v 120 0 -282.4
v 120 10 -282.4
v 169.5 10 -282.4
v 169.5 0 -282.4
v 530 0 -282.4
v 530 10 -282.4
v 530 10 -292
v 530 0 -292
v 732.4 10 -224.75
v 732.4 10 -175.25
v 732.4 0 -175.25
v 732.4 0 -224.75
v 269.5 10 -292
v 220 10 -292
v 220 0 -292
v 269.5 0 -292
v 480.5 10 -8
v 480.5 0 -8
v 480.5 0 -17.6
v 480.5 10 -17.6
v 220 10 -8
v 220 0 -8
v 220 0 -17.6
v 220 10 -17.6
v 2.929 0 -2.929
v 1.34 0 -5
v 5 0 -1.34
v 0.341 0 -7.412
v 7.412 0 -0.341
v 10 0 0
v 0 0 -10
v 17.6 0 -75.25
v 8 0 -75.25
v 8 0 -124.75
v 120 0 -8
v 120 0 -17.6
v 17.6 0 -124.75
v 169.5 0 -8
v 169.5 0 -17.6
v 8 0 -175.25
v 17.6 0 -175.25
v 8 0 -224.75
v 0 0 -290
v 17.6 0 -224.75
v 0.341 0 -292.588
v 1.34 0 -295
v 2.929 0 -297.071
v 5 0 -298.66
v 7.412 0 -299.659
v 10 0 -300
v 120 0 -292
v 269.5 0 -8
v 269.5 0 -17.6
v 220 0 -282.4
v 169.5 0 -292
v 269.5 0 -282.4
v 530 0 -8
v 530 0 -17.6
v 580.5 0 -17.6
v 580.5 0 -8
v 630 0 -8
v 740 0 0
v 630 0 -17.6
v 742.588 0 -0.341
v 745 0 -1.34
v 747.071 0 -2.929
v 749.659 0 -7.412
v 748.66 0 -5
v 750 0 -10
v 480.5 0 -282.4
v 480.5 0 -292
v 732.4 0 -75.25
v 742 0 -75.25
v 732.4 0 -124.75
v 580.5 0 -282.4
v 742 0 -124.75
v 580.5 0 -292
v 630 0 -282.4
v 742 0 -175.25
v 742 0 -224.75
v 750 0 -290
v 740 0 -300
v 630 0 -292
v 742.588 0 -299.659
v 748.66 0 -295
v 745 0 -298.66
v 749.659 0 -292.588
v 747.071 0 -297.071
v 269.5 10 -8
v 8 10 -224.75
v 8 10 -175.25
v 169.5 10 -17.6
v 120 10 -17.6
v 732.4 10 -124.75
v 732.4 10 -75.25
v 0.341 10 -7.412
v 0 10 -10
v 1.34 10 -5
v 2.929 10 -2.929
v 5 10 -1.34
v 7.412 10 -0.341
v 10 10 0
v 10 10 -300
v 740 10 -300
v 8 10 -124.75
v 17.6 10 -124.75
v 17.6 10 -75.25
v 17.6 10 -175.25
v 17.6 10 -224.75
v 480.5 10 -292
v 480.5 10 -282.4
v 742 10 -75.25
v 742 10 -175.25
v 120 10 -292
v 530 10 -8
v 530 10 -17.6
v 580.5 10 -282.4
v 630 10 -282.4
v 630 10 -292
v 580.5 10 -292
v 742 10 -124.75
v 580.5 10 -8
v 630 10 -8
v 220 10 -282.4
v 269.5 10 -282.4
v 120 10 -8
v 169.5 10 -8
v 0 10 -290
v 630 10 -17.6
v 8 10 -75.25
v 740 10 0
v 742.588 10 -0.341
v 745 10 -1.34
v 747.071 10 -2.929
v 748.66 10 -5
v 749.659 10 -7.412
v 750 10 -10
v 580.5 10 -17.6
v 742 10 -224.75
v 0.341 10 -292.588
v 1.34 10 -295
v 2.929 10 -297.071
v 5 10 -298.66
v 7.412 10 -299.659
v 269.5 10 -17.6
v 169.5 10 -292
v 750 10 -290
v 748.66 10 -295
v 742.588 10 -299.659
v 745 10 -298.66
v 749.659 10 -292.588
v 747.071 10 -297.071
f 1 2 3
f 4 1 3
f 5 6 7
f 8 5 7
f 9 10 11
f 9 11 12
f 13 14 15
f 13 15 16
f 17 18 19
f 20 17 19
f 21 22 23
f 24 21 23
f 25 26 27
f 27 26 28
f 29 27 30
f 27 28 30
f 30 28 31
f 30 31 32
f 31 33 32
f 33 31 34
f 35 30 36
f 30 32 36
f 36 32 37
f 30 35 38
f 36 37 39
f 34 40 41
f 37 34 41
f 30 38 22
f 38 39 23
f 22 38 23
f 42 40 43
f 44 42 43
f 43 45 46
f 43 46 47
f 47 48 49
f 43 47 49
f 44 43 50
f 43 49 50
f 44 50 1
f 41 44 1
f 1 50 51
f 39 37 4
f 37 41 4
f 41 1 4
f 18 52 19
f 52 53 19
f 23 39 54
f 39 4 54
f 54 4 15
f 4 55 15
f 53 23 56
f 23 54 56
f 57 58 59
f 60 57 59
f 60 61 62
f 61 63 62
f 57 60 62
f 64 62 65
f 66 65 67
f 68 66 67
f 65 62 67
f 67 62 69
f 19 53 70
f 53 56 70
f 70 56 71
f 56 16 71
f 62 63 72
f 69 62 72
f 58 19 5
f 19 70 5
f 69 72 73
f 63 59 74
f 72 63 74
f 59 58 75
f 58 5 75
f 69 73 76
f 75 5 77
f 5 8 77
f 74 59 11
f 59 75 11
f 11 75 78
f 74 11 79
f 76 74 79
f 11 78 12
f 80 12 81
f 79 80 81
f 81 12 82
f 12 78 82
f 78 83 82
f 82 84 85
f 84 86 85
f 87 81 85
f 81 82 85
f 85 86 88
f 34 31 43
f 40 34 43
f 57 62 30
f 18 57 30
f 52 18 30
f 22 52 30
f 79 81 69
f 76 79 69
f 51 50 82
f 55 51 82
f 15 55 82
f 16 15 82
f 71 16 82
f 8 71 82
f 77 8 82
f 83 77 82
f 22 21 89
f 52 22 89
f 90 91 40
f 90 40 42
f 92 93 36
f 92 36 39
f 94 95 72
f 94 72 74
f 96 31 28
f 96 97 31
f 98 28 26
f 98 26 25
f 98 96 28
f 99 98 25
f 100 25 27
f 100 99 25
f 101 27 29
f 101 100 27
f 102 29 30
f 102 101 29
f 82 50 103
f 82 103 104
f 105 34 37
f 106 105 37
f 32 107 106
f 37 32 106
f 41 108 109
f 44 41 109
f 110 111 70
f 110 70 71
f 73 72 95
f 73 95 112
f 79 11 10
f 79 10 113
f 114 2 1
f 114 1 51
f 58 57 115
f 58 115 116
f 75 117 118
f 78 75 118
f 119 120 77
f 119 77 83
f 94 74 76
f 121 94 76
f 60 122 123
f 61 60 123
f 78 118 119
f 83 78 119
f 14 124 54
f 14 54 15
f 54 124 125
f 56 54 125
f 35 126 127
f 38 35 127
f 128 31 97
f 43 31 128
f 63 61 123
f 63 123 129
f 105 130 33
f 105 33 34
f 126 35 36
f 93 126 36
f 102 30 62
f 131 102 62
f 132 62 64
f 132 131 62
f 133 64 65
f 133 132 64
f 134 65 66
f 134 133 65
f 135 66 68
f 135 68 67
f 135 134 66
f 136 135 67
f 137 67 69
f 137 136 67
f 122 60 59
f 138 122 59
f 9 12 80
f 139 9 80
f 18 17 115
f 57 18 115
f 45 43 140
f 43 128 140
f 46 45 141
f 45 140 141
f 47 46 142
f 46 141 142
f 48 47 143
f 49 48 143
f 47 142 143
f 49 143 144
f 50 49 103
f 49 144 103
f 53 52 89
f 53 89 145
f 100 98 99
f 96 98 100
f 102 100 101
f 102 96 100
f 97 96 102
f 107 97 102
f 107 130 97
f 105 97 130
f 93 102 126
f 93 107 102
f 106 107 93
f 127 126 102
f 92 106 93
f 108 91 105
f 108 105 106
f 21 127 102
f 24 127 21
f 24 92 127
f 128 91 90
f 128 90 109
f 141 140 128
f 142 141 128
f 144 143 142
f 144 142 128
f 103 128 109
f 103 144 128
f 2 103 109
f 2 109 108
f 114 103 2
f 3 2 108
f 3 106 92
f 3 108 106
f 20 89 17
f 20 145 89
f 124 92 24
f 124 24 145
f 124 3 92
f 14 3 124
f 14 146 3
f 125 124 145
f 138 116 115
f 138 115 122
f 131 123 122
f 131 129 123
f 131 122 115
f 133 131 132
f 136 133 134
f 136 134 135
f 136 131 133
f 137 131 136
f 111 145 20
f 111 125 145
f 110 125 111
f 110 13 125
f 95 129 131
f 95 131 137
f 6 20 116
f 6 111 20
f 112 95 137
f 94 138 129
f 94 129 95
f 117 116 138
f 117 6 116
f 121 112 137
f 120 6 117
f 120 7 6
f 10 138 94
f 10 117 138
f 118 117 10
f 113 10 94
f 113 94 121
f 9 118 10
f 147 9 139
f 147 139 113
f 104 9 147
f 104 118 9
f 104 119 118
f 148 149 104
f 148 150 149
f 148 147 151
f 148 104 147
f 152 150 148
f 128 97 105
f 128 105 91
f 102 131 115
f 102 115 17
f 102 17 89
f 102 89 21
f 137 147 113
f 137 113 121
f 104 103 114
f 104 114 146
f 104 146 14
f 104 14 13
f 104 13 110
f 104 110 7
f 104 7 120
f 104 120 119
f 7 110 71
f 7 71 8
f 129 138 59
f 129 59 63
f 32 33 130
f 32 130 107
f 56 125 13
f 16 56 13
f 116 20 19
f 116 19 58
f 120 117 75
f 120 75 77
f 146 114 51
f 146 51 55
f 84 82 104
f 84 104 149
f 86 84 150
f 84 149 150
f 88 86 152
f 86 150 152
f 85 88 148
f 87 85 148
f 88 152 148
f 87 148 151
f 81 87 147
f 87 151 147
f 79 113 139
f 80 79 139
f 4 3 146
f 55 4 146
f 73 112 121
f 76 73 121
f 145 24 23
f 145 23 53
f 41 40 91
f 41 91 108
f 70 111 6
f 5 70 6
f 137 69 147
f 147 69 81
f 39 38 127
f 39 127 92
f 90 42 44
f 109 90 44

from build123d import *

# Parameters (mm, degrees)
SKETCH1_W           = 750
SKETCH1_H           = 300
BOSS_EXTRUDE1_DEPTH = 10
SKETCH4_W           = 9.6
SKETCH4_H           = 49.5
SKETCH4_W_2         = 49.5
SKETCH4_H_2         = 9.6
CUT_EXTRUDE3_DEPTH  = 11
FILLET1_R           = 10


with BuildPart() as part:
    # Sketch1 → Boss-Extrude1 (new body)
    with BuildSketch(Plane(origin=(0, 0, 0), x_dir=(1, 0, 0), z_dir=(0, 1, 0))):
        with Locations((375, 150)):
            Rectangle(SKETCH1_W, SKETCH1_H)
    extrude(amount=BOSS_EXTRUDE1_DEPTH)

    # Sketch4 → Cut-Extrude3 (cut, through all)
    with BuildSketch(Plane(origin=(0, 10, 0), x_dir=(1, 0, 0), z_dir=(0, 1, 0))):
        with Locations((12.8, 100)):
            Rectangle(SKETCH4_W, SKETCH4_H)
        with Locations((12.8, 200)):
            Rectangle(SKETCH4_W, SKETCH4_H)
        with Locations((737.2, 200)):
            Rectangle(SKETCH4_W, SKETCH4_H)
        with Locations((737.2, 100)):
            Rectangle(SKETCH4_W, SKETCH4_H)
        with Locations((144.75, 287.2)):
            Rectangle(SKETCH4_W_2, SKETCH4_H_2)
        with Locations((244.75, 287.2)):
            Rectangle(SKETCH4_W_2, SKETCH4_H_2)
        with Locations((505.25, 287.2)):
            Rectangle(SKETCH4_W_2, SKETCH4_H_2)
        with Locations((605.25, 287.2)):
            Rectangle(SKETCH4_W_2, SKETCH4_H_2)
        with Locations((605.25, 12.8)):
            Rectangle(SKETCH4_W_2, SKETCH4_H_2)
        with Locations((505.25, 12.8)):
            Rectangle(SKETCH4_W_2, SKETCH4_H_2)
        with Locations((244.75, 12.8)):
            Rectangle(SKETCH4_W_2, SKETCH4_H_2)
        with Locations((144.75, 12.8)):
            Rectangle(SKETCH4_W_2, SKETCH4_H_2)
    extrude(amount=-CUT_EXTRUDE3_DEPTH, mode=Mode.SUBTRACT)

    # Fillet1
    fillet1_edges = [part.edges().sort_by_distance(p)[0] for p in [
        (0, 5, 0),
        (750, 5, 0),
        (750, 5, -300),
        (0, 5, -300),
    ]]
    fillet(fillet1_edges, radius=FILLET1_R)


solid = part.part
